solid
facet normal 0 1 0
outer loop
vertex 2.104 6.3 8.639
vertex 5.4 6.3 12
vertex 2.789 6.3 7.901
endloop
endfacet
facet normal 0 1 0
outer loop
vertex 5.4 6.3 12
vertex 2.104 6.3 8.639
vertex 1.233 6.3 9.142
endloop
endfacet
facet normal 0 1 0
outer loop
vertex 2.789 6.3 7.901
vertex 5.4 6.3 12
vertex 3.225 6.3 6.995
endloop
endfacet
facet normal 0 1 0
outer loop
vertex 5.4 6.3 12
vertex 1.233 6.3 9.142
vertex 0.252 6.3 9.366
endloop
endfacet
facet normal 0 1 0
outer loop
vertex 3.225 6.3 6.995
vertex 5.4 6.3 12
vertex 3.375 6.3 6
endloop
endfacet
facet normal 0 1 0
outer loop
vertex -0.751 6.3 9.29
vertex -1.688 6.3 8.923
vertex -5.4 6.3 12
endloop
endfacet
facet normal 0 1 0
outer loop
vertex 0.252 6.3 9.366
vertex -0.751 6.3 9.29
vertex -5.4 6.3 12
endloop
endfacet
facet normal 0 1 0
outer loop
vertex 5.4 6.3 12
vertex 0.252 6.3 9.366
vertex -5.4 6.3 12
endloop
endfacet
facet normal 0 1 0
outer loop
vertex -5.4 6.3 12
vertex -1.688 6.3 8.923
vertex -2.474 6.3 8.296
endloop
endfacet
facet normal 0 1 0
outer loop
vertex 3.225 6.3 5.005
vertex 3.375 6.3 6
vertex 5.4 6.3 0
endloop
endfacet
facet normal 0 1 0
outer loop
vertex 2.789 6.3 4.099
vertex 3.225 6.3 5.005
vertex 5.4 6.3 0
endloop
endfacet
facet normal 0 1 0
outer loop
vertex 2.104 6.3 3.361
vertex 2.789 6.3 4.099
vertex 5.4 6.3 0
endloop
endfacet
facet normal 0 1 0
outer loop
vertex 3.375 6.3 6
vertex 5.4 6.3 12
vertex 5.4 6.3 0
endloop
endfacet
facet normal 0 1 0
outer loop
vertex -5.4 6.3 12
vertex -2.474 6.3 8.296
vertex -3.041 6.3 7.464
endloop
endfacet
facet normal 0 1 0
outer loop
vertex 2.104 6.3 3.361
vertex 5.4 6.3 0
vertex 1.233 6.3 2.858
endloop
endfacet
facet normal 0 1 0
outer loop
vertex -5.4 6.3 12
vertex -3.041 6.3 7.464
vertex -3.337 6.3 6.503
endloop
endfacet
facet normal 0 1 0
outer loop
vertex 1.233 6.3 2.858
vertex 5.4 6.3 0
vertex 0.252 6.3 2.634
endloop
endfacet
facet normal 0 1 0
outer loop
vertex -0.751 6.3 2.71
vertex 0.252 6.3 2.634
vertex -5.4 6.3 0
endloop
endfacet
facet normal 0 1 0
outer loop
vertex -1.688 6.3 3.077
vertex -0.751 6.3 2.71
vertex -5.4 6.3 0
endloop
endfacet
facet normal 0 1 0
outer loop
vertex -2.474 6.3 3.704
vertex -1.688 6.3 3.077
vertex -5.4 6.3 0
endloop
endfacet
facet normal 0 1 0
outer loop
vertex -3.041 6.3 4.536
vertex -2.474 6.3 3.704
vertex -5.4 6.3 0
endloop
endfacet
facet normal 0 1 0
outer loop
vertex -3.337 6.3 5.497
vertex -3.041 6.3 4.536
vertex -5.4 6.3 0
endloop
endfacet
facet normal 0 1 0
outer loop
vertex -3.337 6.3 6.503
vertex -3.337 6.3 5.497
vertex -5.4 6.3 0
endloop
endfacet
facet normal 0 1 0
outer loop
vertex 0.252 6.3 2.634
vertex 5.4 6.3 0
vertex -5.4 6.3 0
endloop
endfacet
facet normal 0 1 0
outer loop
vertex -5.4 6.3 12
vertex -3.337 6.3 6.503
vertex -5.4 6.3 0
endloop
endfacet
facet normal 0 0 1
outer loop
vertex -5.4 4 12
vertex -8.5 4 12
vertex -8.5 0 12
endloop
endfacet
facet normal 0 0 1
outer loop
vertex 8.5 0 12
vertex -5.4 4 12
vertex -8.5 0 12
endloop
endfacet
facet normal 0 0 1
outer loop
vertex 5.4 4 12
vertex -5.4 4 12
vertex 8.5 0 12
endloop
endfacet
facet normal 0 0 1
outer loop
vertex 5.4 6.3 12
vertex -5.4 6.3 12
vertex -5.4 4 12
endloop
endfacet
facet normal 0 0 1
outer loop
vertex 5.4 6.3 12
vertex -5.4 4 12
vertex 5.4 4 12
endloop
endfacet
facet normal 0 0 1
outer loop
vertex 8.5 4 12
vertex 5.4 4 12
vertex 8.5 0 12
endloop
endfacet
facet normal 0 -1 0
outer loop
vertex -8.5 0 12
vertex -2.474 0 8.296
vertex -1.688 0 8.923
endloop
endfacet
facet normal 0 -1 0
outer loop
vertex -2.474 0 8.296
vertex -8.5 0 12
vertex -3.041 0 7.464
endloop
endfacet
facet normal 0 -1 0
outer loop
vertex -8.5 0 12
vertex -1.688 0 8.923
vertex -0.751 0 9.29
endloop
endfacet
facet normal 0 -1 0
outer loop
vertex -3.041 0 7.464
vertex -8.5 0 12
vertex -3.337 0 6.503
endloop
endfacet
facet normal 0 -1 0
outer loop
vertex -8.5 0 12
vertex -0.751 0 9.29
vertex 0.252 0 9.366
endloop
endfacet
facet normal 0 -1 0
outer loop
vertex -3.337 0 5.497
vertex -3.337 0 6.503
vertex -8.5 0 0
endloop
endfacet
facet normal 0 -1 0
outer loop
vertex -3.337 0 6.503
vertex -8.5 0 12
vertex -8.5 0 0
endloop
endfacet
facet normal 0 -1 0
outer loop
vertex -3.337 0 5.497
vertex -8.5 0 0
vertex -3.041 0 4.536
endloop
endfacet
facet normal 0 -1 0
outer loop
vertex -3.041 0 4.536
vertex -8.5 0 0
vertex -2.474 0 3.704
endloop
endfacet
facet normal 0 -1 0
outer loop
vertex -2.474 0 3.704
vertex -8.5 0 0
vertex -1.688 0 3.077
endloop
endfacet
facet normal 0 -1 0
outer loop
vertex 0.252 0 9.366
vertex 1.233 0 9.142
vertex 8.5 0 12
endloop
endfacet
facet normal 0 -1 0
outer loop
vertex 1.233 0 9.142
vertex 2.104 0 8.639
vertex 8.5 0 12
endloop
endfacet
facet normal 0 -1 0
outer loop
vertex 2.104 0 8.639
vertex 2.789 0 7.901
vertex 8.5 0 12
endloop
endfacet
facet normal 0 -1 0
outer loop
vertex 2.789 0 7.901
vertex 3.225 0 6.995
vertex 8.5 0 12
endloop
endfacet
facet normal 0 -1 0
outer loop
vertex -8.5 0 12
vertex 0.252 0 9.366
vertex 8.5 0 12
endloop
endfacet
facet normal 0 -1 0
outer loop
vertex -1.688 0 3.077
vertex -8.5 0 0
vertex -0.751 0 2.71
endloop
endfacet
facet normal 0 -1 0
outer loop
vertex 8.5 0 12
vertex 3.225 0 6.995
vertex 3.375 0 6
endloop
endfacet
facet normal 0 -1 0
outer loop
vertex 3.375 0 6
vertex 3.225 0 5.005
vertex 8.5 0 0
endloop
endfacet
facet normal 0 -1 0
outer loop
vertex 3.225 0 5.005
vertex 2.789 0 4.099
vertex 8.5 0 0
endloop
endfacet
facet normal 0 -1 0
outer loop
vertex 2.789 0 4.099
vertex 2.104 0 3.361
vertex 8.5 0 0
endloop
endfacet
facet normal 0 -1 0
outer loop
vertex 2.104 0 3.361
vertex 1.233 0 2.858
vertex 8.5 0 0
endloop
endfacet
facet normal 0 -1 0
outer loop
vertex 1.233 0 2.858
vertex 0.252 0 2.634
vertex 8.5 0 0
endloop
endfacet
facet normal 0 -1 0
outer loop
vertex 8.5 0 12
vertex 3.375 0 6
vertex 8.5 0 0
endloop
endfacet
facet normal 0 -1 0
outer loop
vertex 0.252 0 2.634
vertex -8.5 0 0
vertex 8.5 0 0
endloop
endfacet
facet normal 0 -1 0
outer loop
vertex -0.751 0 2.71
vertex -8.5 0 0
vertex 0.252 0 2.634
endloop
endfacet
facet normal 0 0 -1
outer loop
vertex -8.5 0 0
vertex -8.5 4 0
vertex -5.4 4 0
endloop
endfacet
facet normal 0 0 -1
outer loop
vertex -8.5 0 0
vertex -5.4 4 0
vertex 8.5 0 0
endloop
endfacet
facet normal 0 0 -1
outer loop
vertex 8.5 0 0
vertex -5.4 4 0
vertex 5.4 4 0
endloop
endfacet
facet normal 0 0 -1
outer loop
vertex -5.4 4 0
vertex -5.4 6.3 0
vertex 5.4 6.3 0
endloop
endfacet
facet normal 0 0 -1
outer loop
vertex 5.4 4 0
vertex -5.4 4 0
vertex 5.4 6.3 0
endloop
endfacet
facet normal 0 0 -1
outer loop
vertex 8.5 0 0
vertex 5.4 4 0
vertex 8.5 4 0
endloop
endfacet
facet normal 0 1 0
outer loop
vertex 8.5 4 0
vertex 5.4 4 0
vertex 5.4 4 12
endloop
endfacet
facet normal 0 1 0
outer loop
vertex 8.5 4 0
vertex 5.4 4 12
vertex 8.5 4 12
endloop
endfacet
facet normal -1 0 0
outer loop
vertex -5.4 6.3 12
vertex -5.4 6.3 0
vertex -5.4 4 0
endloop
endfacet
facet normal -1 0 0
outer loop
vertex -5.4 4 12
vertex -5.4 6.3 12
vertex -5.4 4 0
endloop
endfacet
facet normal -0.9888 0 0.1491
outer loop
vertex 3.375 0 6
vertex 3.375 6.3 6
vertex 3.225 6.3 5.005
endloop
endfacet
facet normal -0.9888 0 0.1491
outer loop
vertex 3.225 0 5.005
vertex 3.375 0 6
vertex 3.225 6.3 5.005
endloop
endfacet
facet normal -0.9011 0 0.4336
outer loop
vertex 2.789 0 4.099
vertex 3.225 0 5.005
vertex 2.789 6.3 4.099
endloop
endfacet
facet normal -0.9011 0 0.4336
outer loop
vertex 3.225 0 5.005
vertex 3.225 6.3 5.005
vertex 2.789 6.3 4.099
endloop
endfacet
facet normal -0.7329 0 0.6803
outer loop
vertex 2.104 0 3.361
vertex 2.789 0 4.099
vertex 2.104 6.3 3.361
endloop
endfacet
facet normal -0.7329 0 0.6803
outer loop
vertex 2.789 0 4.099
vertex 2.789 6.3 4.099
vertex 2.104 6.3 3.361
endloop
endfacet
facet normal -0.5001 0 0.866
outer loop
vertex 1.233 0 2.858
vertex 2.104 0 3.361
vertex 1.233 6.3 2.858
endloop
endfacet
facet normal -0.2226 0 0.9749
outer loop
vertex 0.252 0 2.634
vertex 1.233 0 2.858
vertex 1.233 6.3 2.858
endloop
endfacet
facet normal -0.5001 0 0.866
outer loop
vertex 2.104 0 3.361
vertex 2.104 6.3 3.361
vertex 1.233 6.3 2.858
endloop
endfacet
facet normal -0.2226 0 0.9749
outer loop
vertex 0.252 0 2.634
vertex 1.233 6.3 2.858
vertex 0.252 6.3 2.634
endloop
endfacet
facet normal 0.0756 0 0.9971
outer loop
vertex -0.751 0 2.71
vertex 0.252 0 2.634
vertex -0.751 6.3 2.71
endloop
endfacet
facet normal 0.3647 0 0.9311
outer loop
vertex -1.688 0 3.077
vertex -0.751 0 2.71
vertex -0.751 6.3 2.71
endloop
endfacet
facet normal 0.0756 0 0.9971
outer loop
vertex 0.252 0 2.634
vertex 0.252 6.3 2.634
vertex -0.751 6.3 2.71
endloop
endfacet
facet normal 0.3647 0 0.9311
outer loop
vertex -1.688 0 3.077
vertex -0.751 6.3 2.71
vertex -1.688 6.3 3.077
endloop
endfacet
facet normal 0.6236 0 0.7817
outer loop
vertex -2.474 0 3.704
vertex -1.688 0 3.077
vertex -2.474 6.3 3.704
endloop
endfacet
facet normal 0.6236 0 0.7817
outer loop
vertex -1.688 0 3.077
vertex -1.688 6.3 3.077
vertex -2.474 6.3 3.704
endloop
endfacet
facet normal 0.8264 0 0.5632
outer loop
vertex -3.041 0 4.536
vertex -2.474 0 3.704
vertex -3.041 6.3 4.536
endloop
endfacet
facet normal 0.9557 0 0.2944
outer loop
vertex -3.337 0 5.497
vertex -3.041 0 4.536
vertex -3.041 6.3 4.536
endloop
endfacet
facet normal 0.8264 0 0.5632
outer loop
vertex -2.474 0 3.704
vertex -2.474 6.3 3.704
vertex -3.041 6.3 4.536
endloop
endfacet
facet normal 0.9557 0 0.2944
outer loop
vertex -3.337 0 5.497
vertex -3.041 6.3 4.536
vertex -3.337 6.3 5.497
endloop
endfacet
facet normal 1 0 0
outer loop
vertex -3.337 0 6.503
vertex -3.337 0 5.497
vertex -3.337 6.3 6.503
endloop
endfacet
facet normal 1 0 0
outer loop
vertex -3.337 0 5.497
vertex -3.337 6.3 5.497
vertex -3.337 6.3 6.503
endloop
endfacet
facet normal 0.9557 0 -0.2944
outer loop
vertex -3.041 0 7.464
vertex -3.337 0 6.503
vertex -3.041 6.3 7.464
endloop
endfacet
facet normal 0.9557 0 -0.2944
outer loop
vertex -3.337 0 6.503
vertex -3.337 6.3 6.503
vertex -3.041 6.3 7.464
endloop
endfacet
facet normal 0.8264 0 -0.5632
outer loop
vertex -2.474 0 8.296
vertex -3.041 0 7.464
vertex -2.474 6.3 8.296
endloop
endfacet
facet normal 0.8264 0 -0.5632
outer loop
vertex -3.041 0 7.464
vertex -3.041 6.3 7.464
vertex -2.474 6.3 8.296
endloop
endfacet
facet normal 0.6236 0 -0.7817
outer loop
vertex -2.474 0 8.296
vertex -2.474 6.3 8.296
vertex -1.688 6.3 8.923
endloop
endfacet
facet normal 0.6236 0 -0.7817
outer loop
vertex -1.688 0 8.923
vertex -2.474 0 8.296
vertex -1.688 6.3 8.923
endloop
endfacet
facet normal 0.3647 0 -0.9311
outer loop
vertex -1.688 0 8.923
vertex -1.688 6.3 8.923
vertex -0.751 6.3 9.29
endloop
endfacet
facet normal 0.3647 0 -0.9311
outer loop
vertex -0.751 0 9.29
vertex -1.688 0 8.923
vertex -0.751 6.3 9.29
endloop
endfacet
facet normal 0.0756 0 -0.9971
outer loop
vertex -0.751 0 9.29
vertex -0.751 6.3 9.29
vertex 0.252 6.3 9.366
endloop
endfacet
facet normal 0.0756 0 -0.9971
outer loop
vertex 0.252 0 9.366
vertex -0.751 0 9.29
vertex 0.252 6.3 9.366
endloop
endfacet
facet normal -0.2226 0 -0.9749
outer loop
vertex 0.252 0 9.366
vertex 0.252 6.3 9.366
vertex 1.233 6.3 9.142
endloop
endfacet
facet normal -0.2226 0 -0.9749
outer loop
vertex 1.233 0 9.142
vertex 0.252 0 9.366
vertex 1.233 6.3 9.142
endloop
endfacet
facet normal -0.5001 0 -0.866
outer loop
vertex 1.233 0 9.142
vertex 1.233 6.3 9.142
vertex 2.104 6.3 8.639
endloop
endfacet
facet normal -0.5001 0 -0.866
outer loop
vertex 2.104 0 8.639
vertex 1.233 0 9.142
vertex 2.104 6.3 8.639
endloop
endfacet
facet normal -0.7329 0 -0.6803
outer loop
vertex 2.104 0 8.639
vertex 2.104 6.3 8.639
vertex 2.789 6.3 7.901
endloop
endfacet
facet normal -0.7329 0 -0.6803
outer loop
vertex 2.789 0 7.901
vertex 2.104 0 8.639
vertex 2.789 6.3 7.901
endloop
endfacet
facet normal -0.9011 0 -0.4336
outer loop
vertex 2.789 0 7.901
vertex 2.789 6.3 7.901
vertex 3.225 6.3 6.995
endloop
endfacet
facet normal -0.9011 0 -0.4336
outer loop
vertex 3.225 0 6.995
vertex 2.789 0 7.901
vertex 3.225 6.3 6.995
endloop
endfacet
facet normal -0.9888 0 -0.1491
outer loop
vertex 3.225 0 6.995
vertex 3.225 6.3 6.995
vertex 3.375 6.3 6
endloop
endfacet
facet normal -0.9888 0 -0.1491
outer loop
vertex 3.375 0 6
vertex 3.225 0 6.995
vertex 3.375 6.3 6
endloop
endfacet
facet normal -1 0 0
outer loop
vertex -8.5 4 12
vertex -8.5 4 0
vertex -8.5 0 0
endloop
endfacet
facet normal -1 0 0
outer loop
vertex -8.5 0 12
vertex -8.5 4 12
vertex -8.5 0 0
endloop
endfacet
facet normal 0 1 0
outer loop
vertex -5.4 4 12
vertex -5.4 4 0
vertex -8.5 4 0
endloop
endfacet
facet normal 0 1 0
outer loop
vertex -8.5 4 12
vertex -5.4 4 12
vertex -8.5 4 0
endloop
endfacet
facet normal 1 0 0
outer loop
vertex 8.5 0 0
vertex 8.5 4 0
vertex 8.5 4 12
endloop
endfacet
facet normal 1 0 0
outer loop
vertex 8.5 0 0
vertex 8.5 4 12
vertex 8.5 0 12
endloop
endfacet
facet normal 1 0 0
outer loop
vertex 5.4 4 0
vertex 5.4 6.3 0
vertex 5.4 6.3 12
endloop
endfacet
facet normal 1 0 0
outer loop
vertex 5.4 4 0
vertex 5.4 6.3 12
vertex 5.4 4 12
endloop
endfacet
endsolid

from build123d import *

# Parameters (mm, degrees)
BOSS_EXTRUDE1_DEPTH = 12
SKETCH2_R           = 3.375
CUT_EXTRUDE1_DEPTH  = 7


with BuildPart() as part:
    # Sketch1 → Boss-Extrude1 (new body)
    with BuildSketch(Plane.XY):
        Polygon((0, 6.3), (5.4, 6.3), (5.4, 4), (8.5, 4), (8.5, 0), (0, 0), align=None)
    boss_extrude1 = extrude(amount=BOSS_EXTRUDE1_DEPTH)

    # Mirror1: Boss-Extrude1 across plane
    add(boss_extrude1.mirror(Plane(origin=(0, 0, 0), x_dir=(0, 0, 1), z_dir=(1, 0, 0))))

    # Sketch2 → Cut-Extrude1 (cut)
    with BuildSketch(Plane(origin=(0, 6.3, 0), x_dir=(1, 0, 0), z_dir=(0, 1, 0))):
        with Locations((0, -6)):
            Circle(SKETCH2_R)
    extrude(amount=-CUT_EXTRUDE1_DEPTH, mode=Mode.SUBTRACT)


solid = part.part
